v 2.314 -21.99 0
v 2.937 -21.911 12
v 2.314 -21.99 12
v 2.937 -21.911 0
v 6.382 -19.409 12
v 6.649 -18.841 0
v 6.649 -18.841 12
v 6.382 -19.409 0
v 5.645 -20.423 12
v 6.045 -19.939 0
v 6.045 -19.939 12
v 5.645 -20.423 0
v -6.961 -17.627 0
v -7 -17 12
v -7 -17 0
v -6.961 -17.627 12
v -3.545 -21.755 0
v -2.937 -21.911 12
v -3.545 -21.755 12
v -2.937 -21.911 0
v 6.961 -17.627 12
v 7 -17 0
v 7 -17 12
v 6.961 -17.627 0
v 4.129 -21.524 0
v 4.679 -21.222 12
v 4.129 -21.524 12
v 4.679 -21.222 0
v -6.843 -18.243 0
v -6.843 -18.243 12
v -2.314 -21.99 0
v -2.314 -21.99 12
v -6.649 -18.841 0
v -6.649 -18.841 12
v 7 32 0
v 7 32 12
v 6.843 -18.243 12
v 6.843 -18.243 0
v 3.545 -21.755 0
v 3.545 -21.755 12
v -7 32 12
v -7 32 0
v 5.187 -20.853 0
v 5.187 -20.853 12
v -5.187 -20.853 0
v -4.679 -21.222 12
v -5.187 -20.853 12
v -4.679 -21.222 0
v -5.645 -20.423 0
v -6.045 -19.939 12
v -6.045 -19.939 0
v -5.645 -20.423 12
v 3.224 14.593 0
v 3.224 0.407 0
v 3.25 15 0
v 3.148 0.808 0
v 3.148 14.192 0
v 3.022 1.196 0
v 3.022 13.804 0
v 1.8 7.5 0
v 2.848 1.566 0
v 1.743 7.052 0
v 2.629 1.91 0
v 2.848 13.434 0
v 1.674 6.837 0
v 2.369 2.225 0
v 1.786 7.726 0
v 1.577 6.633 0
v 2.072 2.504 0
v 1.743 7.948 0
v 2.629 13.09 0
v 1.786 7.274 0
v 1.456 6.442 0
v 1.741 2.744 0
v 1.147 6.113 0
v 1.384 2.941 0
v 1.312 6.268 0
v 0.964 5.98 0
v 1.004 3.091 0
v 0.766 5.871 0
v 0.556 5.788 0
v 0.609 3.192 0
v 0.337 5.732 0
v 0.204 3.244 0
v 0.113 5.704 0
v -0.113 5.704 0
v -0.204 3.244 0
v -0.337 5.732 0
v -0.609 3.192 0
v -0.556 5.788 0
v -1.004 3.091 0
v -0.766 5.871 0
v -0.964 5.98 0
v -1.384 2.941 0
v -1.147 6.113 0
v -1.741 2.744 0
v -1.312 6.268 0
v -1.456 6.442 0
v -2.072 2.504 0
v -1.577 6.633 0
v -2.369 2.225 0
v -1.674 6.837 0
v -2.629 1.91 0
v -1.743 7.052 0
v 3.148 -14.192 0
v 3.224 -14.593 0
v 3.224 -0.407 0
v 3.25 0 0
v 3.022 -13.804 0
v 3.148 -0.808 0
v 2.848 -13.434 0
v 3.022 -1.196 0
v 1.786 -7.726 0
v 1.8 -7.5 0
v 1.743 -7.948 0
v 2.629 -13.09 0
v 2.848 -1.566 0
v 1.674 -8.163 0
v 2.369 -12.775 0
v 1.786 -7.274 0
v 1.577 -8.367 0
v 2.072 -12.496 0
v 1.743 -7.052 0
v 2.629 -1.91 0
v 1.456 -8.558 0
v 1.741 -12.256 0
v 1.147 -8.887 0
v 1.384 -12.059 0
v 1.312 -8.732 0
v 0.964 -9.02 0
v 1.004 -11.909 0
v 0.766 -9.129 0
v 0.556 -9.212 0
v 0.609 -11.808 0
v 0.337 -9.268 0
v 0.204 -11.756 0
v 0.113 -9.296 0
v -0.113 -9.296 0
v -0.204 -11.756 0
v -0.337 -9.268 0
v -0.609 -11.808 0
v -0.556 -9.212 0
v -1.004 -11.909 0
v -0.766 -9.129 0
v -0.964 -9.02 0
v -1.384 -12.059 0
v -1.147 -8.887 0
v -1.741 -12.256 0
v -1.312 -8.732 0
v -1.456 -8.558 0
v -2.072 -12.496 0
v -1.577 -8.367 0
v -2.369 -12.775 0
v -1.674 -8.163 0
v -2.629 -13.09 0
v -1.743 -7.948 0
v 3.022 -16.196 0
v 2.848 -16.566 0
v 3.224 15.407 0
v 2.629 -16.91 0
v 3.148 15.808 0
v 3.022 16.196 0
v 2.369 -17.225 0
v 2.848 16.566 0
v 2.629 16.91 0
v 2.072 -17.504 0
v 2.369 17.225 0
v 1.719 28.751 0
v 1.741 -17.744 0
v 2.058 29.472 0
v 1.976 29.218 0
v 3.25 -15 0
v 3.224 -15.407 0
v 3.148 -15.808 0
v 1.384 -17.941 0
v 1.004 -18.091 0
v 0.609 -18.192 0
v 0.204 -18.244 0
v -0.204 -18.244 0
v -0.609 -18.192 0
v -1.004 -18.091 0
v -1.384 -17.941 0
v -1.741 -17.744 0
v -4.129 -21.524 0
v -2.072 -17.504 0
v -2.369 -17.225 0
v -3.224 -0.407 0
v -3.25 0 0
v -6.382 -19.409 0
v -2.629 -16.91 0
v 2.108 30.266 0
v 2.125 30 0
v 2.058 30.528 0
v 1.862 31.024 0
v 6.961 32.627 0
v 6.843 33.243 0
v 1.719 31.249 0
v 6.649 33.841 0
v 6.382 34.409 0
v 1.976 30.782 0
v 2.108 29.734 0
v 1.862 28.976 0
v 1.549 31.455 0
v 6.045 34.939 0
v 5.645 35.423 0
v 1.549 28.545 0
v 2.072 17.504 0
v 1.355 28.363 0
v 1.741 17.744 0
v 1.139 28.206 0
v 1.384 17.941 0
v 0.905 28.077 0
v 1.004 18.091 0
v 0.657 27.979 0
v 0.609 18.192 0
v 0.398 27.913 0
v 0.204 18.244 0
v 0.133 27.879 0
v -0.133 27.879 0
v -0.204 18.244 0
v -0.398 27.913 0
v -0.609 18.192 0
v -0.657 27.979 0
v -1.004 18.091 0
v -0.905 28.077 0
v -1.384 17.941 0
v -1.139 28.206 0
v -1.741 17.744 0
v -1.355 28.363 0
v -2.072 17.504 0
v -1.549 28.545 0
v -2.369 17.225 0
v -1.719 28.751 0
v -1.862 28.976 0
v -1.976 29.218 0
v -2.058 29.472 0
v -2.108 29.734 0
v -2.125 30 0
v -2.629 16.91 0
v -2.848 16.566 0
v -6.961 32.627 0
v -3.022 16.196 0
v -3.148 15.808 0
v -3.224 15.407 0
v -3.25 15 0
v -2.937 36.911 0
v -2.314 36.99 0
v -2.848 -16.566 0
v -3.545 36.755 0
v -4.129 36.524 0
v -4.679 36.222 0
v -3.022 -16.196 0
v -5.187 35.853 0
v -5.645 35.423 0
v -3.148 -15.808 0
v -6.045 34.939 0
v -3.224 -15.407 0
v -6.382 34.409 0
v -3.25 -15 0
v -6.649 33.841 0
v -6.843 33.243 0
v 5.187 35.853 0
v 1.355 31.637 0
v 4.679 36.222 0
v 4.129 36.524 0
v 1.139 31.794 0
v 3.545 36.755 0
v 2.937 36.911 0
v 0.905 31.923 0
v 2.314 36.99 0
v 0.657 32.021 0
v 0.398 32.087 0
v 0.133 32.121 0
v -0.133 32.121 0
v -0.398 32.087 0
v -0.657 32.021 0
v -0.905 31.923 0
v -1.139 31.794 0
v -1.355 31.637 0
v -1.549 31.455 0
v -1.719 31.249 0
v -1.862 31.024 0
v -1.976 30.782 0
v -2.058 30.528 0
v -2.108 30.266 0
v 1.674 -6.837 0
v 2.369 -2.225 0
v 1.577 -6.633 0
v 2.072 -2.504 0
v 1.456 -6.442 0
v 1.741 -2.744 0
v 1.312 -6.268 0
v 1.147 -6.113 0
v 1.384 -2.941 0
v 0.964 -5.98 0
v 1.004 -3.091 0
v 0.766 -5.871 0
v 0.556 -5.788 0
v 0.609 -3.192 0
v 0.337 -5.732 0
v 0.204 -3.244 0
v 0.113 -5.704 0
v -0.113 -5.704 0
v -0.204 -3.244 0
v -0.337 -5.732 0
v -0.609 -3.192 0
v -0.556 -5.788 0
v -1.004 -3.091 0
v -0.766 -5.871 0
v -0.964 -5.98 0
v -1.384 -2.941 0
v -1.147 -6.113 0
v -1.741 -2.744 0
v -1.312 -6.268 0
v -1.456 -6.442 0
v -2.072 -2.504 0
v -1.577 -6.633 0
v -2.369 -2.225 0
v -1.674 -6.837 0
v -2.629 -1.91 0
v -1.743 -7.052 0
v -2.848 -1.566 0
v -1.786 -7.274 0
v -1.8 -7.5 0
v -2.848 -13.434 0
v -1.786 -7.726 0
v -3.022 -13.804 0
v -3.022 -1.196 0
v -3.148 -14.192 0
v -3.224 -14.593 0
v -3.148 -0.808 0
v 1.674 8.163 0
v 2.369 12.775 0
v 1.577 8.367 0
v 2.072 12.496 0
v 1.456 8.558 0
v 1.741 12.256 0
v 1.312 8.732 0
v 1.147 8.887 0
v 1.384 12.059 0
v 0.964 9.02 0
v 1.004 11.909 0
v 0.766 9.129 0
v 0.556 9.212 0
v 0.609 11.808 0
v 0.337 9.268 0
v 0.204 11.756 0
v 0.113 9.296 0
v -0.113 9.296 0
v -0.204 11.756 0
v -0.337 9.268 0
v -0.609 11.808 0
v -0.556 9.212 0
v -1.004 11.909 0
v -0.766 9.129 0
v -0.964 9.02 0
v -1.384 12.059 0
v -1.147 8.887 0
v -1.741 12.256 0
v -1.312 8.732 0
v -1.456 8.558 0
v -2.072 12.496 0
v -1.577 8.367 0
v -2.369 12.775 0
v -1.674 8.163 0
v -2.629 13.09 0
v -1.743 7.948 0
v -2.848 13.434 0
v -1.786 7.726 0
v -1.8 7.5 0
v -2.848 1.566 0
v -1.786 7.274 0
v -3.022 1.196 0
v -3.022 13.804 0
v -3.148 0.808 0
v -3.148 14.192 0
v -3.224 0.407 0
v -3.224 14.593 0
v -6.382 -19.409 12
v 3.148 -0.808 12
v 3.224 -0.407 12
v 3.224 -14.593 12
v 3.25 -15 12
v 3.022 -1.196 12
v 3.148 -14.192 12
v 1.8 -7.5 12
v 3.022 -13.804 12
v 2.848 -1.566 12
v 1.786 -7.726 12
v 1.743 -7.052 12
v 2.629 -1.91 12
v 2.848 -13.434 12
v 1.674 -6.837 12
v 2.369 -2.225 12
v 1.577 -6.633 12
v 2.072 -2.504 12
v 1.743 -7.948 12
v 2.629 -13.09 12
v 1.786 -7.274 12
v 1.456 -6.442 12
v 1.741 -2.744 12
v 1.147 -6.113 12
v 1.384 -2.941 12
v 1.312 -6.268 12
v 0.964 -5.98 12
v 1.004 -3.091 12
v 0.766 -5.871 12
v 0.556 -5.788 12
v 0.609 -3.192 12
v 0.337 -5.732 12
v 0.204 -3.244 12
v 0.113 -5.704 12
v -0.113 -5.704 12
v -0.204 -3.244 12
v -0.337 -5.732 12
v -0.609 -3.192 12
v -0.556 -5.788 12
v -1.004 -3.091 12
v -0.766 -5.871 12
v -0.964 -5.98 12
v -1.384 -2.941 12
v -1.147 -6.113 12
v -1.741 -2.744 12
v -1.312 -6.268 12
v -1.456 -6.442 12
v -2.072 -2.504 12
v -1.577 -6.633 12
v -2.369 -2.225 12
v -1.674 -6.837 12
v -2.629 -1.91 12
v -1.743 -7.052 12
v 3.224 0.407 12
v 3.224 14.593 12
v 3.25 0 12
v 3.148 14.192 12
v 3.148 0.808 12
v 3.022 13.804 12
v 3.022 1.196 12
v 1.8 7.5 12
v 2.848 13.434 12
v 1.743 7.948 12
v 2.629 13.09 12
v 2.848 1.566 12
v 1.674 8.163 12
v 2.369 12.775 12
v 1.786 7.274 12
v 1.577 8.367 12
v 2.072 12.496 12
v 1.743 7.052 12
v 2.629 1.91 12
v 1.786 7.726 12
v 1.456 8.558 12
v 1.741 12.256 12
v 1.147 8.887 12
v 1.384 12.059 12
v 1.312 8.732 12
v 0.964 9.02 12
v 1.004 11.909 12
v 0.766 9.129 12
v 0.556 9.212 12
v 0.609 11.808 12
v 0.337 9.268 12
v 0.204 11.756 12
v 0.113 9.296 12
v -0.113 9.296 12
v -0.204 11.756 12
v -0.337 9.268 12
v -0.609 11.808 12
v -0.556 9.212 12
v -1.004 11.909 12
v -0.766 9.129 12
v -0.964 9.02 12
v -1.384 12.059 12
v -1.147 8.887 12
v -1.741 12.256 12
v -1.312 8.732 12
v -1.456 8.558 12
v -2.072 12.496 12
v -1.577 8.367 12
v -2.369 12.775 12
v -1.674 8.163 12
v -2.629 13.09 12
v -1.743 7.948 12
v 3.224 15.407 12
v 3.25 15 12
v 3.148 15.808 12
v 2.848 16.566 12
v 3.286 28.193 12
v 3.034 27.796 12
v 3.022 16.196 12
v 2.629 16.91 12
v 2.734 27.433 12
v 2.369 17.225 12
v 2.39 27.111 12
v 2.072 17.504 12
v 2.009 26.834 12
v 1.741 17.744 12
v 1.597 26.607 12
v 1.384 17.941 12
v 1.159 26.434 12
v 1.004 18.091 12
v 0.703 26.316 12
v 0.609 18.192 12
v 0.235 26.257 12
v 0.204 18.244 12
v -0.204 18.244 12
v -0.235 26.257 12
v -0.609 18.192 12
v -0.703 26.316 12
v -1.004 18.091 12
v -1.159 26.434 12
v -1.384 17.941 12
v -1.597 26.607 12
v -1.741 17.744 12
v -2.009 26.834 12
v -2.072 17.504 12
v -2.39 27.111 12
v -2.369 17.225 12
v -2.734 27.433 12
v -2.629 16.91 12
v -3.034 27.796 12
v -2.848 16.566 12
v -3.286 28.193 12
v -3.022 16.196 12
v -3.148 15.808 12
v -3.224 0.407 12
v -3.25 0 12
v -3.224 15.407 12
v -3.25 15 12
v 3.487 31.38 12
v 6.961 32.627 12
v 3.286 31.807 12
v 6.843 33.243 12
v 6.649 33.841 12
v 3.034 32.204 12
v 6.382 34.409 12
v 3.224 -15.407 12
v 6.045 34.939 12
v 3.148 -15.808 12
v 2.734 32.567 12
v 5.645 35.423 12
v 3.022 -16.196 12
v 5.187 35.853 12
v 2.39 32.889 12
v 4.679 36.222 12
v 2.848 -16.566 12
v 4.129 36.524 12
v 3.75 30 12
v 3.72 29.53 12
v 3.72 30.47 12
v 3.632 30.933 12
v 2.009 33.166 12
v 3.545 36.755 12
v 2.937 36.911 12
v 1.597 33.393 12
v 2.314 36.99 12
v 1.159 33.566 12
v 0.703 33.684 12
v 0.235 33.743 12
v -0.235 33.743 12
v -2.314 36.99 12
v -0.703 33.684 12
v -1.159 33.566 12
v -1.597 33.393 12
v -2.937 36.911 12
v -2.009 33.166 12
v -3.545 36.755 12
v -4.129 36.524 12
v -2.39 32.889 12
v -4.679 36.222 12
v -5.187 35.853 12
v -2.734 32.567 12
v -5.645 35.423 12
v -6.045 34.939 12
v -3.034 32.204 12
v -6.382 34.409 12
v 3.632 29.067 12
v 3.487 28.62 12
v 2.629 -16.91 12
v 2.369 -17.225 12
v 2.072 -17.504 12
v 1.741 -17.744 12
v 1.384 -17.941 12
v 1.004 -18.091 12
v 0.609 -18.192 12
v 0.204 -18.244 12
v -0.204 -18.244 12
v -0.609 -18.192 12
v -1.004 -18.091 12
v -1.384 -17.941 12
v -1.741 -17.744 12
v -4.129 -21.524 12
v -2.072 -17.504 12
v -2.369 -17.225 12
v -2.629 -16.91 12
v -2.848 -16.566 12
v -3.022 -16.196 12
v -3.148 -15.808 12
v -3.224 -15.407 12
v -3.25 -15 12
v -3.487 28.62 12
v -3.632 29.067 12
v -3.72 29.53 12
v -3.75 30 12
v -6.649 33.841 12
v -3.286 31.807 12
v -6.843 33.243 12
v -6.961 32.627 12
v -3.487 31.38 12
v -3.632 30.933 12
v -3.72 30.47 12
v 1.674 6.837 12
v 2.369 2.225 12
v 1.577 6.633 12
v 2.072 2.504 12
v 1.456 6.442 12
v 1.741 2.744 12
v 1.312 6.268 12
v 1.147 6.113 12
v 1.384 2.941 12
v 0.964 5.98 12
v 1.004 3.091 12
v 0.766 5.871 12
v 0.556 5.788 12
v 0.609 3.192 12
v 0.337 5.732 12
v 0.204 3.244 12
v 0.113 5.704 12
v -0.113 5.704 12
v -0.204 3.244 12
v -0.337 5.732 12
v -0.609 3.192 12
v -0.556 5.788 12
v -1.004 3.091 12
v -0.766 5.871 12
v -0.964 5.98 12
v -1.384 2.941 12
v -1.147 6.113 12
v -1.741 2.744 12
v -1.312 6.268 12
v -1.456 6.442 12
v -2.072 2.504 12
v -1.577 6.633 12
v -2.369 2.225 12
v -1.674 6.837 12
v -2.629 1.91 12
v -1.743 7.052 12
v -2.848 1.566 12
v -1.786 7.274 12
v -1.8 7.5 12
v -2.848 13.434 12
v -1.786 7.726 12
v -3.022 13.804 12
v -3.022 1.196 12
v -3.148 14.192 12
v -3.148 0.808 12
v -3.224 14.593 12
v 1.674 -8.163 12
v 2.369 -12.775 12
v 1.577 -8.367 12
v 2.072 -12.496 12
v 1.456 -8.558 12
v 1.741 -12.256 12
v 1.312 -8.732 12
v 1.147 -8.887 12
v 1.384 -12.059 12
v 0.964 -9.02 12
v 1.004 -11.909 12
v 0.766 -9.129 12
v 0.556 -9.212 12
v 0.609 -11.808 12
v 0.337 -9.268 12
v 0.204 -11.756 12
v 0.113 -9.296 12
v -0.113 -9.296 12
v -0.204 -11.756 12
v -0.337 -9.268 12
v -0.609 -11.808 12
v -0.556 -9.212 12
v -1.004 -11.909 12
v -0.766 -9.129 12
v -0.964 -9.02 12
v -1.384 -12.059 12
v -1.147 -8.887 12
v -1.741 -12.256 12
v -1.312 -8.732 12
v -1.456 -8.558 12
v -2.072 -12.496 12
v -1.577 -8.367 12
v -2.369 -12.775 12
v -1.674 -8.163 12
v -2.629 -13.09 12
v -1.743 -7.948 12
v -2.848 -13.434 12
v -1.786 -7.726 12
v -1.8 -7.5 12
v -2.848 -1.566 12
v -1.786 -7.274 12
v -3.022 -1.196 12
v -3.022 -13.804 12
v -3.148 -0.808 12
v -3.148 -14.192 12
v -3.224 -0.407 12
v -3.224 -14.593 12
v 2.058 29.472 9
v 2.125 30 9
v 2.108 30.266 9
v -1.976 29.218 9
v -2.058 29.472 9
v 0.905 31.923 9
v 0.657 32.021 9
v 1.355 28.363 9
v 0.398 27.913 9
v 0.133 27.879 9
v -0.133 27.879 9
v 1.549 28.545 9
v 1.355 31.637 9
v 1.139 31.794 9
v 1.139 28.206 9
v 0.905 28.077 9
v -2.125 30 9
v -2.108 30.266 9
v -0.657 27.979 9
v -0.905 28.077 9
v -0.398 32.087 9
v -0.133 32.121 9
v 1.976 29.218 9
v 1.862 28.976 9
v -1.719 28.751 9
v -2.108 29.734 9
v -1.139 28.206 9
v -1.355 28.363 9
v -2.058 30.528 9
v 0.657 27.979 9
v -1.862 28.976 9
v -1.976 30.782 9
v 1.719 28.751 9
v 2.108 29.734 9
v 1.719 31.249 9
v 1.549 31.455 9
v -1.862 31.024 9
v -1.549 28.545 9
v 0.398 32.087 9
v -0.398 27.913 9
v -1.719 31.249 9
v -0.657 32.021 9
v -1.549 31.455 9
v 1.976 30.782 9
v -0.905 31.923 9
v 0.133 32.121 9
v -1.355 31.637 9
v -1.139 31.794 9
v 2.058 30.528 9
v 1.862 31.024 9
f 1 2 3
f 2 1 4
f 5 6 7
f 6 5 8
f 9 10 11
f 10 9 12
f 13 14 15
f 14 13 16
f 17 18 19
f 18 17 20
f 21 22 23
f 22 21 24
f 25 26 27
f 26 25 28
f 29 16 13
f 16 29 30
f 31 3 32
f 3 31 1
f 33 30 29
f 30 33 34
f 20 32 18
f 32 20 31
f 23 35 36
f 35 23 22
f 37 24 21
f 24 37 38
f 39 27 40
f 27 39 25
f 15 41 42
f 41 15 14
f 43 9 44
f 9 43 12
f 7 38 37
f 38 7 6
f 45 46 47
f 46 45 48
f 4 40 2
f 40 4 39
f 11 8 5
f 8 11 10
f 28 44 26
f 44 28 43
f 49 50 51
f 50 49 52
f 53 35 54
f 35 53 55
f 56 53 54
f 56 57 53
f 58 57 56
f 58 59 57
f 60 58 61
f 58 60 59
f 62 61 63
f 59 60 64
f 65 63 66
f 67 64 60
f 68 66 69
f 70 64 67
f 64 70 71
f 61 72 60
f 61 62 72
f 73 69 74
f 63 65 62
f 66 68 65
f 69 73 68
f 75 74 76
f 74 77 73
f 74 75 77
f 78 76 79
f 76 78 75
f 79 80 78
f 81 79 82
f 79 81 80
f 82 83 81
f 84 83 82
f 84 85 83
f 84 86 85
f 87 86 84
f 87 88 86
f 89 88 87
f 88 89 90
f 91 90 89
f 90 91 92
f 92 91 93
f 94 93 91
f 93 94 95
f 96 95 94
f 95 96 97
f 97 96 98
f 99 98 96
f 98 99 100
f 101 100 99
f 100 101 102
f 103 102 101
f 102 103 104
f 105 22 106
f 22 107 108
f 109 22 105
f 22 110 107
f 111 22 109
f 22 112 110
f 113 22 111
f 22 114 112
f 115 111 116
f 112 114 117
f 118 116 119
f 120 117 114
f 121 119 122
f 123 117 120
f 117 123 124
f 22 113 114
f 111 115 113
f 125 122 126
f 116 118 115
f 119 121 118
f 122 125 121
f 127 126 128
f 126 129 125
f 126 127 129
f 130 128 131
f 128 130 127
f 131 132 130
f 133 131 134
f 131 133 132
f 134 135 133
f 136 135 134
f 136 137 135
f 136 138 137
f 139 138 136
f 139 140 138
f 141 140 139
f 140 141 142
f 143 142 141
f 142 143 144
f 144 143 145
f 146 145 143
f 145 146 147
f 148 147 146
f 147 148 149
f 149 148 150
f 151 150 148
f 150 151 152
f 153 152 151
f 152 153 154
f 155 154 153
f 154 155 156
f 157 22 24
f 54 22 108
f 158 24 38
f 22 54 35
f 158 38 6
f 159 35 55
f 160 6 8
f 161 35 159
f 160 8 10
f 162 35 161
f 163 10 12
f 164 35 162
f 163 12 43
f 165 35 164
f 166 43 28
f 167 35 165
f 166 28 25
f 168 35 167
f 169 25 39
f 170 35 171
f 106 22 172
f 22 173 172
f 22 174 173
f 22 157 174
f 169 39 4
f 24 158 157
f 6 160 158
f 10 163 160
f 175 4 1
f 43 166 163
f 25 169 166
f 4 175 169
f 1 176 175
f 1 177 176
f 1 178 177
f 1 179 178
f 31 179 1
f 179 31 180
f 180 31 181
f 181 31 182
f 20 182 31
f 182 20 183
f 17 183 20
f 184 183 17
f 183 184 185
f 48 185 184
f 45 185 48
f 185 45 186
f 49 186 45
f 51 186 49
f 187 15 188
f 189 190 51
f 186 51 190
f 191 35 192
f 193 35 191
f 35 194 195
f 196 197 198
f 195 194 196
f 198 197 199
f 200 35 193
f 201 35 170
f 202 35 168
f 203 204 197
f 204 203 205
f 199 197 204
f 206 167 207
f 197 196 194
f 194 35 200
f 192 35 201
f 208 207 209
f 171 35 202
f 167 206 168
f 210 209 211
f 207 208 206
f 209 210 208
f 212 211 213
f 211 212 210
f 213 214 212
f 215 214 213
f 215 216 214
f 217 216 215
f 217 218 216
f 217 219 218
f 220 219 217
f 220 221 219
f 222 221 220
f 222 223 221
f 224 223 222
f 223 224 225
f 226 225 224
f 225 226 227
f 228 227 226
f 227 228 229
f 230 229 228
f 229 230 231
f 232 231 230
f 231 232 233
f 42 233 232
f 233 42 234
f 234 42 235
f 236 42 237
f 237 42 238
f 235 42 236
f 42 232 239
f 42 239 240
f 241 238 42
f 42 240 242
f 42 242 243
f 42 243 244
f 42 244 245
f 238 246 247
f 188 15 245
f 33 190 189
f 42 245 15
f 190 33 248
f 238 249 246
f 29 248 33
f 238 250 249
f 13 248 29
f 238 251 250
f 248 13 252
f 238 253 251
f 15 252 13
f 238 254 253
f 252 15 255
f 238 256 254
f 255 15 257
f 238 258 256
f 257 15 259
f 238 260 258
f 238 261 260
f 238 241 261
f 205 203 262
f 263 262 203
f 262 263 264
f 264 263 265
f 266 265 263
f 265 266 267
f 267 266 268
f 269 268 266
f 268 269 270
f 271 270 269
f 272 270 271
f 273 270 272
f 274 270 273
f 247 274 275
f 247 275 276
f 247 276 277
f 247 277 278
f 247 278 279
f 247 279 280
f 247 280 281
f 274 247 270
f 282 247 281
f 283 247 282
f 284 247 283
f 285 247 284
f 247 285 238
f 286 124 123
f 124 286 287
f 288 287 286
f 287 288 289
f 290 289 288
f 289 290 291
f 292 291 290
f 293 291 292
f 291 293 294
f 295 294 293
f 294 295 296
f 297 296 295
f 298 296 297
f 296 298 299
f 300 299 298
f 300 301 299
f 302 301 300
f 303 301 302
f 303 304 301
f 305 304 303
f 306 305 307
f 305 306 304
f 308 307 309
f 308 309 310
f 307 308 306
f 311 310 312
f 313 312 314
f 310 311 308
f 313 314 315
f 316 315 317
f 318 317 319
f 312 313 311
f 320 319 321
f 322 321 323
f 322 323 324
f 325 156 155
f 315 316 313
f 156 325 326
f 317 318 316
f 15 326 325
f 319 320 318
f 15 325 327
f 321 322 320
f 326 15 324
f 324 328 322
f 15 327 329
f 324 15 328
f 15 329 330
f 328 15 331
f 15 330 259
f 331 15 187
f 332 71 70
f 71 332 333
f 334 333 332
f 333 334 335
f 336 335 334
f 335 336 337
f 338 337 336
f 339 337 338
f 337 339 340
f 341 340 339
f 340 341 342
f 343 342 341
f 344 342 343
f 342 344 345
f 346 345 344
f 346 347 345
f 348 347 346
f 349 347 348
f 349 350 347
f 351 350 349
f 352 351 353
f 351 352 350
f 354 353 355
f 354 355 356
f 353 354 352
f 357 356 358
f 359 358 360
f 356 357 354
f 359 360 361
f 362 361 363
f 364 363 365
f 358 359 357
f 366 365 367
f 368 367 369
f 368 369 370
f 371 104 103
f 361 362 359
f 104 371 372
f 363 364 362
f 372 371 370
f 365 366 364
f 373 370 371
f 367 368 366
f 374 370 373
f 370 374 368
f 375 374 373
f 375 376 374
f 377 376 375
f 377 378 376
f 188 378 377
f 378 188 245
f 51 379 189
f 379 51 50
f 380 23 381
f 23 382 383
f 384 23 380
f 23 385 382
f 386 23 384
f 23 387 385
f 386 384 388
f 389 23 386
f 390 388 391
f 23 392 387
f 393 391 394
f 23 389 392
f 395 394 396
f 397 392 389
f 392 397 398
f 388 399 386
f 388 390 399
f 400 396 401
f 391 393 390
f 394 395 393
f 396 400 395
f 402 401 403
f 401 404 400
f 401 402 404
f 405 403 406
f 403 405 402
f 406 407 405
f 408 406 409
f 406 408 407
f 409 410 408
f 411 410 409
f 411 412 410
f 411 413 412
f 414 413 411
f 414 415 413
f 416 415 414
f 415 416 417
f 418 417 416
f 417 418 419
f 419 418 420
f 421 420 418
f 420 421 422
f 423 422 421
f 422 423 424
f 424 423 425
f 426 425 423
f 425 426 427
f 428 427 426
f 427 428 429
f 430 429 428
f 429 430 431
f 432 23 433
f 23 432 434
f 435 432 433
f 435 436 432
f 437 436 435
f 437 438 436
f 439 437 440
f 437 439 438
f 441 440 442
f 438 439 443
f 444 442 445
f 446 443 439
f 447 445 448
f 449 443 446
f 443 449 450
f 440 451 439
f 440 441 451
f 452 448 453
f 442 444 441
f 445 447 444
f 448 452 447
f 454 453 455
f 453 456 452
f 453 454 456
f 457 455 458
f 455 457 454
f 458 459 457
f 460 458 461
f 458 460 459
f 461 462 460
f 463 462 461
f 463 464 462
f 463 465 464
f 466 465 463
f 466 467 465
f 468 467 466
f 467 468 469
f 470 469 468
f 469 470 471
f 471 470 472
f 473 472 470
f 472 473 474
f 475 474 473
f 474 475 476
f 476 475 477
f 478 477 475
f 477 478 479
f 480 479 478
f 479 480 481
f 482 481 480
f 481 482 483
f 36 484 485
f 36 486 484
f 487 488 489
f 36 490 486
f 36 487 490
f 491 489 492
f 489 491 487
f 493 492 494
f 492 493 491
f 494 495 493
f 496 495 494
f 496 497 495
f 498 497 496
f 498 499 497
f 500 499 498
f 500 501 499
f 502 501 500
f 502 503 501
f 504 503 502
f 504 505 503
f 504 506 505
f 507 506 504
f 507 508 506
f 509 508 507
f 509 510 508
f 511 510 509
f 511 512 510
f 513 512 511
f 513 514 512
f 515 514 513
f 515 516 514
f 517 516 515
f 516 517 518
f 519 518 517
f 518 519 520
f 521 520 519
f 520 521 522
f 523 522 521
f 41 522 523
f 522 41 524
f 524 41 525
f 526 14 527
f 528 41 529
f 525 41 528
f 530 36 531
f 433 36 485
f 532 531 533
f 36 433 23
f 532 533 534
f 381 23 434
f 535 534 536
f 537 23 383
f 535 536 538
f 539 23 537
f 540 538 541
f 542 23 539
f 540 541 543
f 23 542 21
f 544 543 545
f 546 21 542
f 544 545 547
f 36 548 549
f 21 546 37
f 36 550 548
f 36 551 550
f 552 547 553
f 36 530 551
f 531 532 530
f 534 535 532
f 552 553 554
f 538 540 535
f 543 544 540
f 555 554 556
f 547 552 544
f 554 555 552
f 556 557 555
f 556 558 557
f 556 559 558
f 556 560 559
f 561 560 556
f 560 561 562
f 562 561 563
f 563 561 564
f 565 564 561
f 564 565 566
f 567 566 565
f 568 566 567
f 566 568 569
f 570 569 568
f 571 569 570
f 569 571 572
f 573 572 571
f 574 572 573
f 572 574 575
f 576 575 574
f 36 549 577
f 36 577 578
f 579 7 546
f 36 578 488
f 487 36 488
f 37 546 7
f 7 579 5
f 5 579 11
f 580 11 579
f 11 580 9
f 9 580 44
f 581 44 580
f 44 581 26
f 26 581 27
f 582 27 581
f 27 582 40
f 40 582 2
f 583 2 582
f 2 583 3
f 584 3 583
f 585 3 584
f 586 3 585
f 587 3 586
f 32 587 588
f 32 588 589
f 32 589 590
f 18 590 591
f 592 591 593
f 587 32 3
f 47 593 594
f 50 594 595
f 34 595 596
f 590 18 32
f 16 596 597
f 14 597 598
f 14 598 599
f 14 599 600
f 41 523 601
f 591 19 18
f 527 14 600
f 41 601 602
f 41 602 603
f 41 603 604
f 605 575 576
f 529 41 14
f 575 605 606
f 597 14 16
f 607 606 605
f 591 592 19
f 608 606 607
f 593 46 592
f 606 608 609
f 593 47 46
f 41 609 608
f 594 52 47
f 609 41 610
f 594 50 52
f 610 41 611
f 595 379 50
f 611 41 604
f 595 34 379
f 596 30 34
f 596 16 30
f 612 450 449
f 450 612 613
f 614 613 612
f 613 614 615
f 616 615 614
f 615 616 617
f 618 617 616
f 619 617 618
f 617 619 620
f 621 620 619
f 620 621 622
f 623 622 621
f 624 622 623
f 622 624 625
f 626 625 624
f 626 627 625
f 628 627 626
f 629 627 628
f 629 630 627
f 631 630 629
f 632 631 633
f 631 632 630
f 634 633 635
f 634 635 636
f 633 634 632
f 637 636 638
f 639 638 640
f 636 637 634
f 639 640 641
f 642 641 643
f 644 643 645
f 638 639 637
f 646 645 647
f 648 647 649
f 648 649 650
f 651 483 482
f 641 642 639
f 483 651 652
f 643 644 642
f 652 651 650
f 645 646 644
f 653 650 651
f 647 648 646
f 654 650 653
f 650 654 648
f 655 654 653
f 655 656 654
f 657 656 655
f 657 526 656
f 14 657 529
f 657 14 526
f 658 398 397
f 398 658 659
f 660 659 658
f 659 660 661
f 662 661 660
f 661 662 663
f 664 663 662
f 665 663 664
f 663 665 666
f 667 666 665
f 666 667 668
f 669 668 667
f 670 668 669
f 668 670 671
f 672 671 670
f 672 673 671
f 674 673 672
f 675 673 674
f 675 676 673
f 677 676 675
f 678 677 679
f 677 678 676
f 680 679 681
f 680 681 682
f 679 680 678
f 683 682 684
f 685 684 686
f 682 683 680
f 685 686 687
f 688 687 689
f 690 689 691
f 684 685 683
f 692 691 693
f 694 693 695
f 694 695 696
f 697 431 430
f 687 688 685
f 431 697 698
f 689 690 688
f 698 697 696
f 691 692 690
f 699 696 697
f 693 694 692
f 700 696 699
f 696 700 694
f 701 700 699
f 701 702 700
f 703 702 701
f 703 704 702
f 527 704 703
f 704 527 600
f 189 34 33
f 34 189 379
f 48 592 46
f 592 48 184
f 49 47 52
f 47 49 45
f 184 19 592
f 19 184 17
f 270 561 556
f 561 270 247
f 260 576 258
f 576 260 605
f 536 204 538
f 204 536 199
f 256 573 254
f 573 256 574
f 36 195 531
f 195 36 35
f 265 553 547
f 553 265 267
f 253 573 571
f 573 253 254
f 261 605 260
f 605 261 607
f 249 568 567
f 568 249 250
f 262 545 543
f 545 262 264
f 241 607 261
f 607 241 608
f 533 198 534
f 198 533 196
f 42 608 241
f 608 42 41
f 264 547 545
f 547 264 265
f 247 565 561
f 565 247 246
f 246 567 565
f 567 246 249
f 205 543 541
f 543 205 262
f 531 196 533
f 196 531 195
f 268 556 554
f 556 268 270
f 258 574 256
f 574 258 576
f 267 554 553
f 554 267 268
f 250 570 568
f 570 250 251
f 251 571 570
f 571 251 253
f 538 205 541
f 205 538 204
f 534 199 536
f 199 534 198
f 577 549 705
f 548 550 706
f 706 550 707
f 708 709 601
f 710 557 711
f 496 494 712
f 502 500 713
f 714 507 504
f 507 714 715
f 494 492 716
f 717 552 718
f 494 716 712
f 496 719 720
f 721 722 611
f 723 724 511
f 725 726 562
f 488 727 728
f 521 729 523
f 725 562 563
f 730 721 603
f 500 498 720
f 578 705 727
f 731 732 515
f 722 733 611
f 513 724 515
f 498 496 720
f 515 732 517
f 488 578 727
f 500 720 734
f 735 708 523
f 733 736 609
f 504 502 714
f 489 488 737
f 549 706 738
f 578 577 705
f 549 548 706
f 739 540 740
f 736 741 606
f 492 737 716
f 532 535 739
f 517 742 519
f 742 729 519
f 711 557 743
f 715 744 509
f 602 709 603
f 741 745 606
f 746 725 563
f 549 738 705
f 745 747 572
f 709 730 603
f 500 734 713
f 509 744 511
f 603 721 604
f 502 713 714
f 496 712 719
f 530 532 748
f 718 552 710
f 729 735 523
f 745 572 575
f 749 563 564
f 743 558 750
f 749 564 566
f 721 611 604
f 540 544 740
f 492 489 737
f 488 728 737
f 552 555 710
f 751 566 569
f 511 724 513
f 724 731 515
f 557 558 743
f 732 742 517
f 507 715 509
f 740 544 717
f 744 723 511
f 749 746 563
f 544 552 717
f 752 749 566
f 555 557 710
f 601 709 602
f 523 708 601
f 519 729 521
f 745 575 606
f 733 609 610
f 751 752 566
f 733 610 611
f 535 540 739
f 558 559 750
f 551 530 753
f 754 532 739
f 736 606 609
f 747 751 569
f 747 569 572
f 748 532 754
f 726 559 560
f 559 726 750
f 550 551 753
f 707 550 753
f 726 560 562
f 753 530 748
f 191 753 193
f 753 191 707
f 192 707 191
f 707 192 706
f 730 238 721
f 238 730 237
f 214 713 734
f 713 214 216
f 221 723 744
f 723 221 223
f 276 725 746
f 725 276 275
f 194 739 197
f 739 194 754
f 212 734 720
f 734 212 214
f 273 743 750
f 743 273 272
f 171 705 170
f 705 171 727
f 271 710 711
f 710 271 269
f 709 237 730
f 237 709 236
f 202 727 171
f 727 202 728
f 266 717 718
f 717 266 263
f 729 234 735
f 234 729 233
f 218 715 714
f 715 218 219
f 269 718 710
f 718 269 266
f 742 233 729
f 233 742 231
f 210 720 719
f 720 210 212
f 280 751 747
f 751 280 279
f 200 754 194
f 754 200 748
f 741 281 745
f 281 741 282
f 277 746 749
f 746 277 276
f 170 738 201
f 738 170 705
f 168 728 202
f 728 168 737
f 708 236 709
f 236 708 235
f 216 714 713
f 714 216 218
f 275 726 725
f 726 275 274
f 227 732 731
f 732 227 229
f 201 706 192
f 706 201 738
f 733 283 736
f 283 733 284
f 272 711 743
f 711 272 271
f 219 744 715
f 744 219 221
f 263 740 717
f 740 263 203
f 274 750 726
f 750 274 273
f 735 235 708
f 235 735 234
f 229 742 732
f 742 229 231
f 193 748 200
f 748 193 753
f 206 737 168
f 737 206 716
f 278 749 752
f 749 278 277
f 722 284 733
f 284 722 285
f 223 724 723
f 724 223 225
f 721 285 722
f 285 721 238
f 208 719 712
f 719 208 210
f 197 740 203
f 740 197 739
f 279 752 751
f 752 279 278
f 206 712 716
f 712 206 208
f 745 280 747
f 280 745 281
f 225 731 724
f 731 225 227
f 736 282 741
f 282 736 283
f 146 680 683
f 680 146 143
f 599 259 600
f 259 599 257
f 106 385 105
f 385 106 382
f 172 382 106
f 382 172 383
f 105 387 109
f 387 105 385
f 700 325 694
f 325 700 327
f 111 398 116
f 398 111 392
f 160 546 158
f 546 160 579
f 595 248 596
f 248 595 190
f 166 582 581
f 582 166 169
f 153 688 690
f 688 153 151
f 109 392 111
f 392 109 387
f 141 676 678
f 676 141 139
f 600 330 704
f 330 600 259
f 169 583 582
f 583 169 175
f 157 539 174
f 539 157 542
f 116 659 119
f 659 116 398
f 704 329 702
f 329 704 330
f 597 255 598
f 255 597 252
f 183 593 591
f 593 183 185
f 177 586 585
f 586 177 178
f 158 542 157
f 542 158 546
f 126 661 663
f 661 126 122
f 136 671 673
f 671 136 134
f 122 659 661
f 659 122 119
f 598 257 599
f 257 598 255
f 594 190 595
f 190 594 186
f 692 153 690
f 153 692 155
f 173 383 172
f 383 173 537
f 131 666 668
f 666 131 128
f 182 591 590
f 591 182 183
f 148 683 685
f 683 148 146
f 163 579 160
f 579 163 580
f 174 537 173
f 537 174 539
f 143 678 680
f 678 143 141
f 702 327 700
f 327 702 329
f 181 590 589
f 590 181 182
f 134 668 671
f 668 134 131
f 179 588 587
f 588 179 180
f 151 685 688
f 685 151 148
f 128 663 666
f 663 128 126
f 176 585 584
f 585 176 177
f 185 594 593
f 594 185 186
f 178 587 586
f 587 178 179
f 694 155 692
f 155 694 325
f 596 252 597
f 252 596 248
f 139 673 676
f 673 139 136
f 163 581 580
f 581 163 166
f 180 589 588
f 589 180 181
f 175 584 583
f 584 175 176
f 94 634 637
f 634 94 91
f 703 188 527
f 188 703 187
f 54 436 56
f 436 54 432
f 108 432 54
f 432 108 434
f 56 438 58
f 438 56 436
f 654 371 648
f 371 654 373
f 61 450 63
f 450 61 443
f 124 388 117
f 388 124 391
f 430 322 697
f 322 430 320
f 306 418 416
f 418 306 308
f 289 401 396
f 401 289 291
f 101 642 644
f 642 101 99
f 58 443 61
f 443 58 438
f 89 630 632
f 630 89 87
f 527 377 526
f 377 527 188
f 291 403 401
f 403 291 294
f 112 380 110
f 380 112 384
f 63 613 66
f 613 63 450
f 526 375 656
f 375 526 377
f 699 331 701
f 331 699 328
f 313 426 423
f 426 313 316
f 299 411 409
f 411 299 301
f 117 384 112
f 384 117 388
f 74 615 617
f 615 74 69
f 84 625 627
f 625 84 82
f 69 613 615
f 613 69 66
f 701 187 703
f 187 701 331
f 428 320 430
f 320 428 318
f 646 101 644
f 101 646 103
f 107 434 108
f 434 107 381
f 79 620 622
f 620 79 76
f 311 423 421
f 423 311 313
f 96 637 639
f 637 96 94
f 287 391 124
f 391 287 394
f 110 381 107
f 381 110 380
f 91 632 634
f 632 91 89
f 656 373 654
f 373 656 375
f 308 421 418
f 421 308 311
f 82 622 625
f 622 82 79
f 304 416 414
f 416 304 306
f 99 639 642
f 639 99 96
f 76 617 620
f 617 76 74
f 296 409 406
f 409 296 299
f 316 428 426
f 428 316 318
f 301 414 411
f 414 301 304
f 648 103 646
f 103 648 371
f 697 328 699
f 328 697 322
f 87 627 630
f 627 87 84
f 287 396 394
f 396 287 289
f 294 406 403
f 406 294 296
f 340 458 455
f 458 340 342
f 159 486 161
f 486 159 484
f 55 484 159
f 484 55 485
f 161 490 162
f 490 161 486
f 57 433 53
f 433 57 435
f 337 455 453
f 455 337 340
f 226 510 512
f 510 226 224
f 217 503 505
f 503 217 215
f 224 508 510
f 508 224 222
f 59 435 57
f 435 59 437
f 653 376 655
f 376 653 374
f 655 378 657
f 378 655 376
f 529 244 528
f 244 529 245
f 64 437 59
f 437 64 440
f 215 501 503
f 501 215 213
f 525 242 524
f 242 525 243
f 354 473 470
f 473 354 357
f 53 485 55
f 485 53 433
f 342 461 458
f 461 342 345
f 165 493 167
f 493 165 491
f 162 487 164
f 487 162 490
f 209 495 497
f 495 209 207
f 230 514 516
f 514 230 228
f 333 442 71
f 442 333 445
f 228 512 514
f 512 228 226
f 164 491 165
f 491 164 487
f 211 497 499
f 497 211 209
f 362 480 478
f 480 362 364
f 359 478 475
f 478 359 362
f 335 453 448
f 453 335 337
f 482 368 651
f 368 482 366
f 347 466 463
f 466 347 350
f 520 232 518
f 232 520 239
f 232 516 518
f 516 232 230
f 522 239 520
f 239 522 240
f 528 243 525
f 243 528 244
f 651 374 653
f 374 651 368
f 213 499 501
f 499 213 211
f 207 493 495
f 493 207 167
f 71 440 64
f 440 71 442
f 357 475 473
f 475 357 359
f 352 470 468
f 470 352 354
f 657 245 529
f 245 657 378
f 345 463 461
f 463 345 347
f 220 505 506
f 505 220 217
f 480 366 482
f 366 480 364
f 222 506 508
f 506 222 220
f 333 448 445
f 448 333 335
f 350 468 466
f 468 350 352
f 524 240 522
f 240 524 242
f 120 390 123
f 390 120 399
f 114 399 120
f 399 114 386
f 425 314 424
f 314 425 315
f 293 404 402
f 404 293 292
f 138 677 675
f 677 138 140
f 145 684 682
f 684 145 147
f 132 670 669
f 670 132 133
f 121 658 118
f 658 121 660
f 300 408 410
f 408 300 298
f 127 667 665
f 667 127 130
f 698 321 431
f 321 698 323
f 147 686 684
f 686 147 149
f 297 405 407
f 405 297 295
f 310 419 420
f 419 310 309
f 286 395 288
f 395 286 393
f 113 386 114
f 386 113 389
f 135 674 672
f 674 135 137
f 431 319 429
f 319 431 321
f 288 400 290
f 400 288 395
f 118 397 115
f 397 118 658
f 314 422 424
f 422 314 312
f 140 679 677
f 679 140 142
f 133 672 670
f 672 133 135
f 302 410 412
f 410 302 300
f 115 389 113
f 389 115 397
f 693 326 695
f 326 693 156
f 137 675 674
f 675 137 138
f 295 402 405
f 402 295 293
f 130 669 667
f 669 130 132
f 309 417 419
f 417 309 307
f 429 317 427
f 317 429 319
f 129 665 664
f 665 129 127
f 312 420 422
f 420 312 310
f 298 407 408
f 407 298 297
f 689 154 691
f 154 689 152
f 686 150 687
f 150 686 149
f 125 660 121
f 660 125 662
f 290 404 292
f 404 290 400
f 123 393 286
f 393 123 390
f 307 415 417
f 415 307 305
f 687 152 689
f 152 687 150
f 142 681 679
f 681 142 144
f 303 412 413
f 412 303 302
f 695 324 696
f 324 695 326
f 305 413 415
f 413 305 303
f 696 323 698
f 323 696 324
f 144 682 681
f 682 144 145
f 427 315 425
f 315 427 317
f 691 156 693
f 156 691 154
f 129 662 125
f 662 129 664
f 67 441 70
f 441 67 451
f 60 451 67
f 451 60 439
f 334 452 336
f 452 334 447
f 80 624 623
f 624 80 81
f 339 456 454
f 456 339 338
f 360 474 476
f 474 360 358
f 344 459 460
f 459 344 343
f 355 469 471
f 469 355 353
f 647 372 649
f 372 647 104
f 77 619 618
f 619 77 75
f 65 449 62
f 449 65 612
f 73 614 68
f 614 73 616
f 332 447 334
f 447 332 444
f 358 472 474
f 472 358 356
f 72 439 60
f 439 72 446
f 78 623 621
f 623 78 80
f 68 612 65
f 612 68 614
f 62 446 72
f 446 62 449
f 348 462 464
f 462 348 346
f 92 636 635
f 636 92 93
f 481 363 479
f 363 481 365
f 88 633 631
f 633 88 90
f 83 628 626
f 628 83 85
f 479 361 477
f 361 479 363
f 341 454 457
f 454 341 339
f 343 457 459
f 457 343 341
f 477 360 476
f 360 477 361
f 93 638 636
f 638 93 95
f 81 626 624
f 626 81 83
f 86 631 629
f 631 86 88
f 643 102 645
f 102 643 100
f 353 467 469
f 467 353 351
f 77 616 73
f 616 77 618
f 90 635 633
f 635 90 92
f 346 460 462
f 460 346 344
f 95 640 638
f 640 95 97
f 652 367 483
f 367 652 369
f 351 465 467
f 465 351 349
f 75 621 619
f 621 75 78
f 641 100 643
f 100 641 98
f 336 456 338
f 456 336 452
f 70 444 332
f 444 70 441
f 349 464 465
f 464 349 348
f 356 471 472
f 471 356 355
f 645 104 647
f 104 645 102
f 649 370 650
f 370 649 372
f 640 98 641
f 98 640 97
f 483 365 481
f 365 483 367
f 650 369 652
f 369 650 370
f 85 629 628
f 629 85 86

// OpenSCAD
$fn = 50;


difference() {
	union() {
		hull() {
			translate(v = [-2.0000000000, 17.0000000000, 0]) {
				cylinder(h = 12, r = 5);
			}
			translate(v = [2.0000000000, 17.0000000000, 0]) {
				cylinder(h = 12, r = 5);
			}
			translate(v = [-2.0000000000, -17.0000000000, 0]) {
				cylinder(h = 12, r = 5);
			}
			translate(v = [2.0000000000, -17.0000000000, 0]) {
				cylinder(h = 12, r = 5);
			}
		}
		translate(v = [0.0000000000, 22.5000000000, 0]) {
			hull() {
				translate(v = [-2.0000000000, 9.5000000000, 0]) {
					cylinder(h = 12, r = 5);
				}
				translate(v = [2.0000000000, 9.5000000000, 0]) {
					cylinder(h = 12, r = 5);
				}
				translate(v = [-2.0000000000, -9.5000000000, 0]) {
					cylinder(h = 12, r = 5);
				}
				translate(v = [2.0000000000, -9.5000000000, 0]) {
					cylinder(h = 12, r = 5);
				}
			}
		}
		translate(v = [0.0000000000, 22.5000000000, 0]) {
			hull() {
				translate(v = [-2.0000000000, 9.5000000000, 0]) {
					cylinder(h = 12, r = 5);
				}
				translate(v = [2.0000000000, 9.5000000000, 0]) {
					cylinder(h = 12, r = 5);
				}
				translate(v = [-2.0000000000, -9.5000000000, 0]) {
					cylinder(h = 12, r = 5);
				}
				translate(v = [2.0000000000, -9.5000000000, 0]) {
					cylinder(h = 12, r = 5);
				}
			}
		}
	}
	union() {
		translate(v = [0.0000000000, 30.0000000000, 12]) {
			rotate(a = [0, 0, 0]) {
				difference() {
					union() {
						#translate(v = [0, 0, -12.0000000000]) {
							cylinder(h = 12, r = 2.0000000000);
						}
						#translate(v = [0, 0, -3]) {
							cylinder(h = 3, r1 = 2.1250000000, r2 = 3.7500000000);
						}
						#translate(v = [0, 0, -12.0000000000]) {
							cylinder(h = 12, r = 2.1250000000);
						}
						#translate(v = [0, 0, -12.0000000000]) {
							cylinder(h = 12, r = 2.0000000000);
						}
					}
					union();
				}
			}
		}
		translate(v = [0.0000000000, 30.0000000000, 12]) {
			rotate(a = [0, 0, 0]) {
				difference() {
					union() {
						#translate(v = [0, 0, -12.0000000000]) {
							cylinder(h = 12, r = 2.0000000000);
						}
						#translate(v = [0, 0, -3]) {
							cylinder(h = 3, r1 = 2.1250000000, r2 = 3.7500000000);
						}
						#translate(v = [0, 0, -12.0000000000]) {
							cylinder(h = 12, r = 2.1250000000);
						}
						#translate(v = [0, 0, -12.0000000000]) {
							cylinder(h = 12, r = 2.0000000000);
						}
					}
					union();
				}
			}
		}
		translate(v = [0.0000000000, -15.0000000000, 0]) {
			translate(v = [0, 0, -100]) {
				cylinder(h = 200, r = 3.2500000000);
			}
		}
		translate(v = [0, 0, -100]) {
			cylinder(h = 200, r = 3.2500000000);
		}
		translate(v = [0.0000000000, 15.0000000000, 0]) {
			translate(v = [0, 0, -100]) {
				cylinder(h = 200, r = 3.2500000000);
			}
		}
		translate(v = [0.0000000000, -15.0000000000, 0]) {
			translate(v = [0, 0, -100]) {
				cylinder(h = 200, r = 1.8000000000);
			}
		}
		translate(v = [0.0000000000, -7.5000000000, 0]) {
			translate(v = [0, 0, -100]) {
				cylinder(h = 200, r = 1.8000000000);
			}
		}
		translate(v = [0, 0, -100]) {
			cylinder(h = 200, r = 1.8000000000);
		}
		translate(v = [0.0000000000, 7.5000000000, 0]) {
			translate(v = [0, 0, -100]) {
				cylinder(h = 200, r = 1.8000000000);
			}
		}
		translate(v = [0.0000000000, 15.0000000000, 0]) {
			translate(v = [0, 0, -100]) {
				cylinder(h = 200, r = 1.8000000000);
			}
		}
	}
}
